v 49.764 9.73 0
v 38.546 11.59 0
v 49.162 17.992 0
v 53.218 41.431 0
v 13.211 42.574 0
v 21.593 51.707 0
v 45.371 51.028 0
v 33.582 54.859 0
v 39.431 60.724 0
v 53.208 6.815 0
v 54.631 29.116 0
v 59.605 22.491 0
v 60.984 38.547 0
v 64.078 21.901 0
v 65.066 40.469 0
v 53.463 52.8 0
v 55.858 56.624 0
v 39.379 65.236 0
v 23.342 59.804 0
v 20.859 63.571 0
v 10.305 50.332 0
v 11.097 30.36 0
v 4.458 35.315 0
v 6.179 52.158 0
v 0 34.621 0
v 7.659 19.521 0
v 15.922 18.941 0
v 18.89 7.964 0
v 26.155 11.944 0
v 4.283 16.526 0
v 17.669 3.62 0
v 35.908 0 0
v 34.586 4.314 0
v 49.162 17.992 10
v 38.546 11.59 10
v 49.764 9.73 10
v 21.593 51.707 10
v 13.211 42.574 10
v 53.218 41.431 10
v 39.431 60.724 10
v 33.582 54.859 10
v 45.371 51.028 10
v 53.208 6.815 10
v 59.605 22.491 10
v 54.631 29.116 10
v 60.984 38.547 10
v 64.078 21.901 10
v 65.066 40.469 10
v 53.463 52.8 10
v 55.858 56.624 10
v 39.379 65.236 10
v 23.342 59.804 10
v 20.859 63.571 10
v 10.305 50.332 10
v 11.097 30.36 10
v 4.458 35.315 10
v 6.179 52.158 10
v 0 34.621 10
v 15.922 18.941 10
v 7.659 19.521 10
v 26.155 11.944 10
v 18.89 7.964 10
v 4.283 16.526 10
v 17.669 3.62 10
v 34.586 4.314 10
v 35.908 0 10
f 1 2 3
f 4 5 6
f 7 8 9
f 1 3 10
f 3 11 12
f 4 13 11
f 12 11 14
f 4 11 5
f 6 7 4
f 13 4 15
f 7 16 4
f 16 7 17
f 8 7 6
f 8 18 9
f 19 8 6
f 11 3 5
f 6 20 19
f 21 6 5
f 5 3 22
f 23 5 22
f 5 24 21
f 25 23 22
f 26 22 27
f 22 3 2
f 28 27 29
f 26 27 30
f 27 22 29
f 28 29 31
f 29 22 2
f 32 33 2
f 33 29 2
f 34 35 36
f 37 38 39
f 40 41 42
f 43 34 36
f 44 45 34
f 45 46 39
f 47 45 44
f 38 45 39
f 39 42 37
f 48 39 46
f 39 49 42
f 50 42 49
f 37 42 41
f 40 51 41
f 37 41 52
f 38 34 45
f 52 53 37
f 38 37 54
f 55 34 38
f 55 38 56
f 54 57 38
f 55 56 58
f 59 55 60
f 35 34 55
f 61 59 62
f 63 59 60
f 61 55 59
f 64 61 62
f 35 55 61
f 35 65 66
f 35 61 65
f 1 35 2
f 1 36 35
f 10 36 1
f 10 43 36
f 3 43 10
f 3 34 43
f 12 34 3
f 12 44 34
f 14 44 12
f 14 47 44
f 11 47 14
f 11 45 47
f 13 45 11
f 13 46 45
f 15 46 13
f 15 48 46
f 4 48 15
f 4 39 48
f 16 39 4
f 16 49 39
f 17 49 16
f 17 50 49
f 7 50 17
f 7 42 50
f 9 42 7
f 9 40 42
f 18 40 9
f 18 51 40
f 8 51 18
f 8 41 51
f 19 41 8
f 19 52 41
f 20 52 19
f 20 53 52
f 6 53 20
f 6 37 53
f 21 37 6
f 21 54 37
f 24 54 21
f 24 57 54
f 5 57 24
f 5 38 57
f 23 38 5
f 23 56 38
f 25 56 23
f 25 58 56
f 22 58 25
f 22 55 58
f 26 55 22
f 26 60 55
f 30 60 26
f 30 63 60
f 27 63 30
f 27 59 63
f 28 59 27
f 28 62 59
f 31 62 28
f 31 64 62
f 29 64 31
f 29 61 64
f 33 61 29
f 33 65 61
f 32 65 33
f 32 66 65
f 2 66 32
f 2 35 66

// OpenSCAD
$fn = 32;

// ----------------------------------------------------------------------
// Fan rotor section: 11 blades, 22 mm hub radius, 11 mm blades
// ----------------------------------------------------------------------

// --- parameters (mm) ---
profile_height = 10;      // extrusion height
profile_points = 33;      // points of the closed outline

profile = [[54.631, 29.116], [60.984, 38.547], [65.066, 40.469], [53.218, 41.431], [53.463, 52.8], [55.858, 56.624], [45.371, 51.028], [39.431, 60.724], [39.379, 65.236], [33.582, 54.859], [23.342, 59.804], [20.859, 63.571], [21.593, 51.707], [10.305, 50.332], [6.179, 52.158], [13.211, 42.574], [4.458, 35.315], [0, 34.621], [11.097, 30.36], [7.659, 19.521], [4.283, 16.526], [15.922, 18.941], [18.89, 7.964], [17.669, 3.62], [26.155, 11.944], [34.586, 4.314], [35.908, 0], [38.546, 11.59], [49.764, 9.73], [53.208, 6.815], [49.162, 17.992], [59.605, 22.491], [64.078, 21.901]];  // single closed polygon, 33 points, counter clockwise

// --- the one profile operation ---
linear_extrude(height = profile_height) polygon(points = profile);
